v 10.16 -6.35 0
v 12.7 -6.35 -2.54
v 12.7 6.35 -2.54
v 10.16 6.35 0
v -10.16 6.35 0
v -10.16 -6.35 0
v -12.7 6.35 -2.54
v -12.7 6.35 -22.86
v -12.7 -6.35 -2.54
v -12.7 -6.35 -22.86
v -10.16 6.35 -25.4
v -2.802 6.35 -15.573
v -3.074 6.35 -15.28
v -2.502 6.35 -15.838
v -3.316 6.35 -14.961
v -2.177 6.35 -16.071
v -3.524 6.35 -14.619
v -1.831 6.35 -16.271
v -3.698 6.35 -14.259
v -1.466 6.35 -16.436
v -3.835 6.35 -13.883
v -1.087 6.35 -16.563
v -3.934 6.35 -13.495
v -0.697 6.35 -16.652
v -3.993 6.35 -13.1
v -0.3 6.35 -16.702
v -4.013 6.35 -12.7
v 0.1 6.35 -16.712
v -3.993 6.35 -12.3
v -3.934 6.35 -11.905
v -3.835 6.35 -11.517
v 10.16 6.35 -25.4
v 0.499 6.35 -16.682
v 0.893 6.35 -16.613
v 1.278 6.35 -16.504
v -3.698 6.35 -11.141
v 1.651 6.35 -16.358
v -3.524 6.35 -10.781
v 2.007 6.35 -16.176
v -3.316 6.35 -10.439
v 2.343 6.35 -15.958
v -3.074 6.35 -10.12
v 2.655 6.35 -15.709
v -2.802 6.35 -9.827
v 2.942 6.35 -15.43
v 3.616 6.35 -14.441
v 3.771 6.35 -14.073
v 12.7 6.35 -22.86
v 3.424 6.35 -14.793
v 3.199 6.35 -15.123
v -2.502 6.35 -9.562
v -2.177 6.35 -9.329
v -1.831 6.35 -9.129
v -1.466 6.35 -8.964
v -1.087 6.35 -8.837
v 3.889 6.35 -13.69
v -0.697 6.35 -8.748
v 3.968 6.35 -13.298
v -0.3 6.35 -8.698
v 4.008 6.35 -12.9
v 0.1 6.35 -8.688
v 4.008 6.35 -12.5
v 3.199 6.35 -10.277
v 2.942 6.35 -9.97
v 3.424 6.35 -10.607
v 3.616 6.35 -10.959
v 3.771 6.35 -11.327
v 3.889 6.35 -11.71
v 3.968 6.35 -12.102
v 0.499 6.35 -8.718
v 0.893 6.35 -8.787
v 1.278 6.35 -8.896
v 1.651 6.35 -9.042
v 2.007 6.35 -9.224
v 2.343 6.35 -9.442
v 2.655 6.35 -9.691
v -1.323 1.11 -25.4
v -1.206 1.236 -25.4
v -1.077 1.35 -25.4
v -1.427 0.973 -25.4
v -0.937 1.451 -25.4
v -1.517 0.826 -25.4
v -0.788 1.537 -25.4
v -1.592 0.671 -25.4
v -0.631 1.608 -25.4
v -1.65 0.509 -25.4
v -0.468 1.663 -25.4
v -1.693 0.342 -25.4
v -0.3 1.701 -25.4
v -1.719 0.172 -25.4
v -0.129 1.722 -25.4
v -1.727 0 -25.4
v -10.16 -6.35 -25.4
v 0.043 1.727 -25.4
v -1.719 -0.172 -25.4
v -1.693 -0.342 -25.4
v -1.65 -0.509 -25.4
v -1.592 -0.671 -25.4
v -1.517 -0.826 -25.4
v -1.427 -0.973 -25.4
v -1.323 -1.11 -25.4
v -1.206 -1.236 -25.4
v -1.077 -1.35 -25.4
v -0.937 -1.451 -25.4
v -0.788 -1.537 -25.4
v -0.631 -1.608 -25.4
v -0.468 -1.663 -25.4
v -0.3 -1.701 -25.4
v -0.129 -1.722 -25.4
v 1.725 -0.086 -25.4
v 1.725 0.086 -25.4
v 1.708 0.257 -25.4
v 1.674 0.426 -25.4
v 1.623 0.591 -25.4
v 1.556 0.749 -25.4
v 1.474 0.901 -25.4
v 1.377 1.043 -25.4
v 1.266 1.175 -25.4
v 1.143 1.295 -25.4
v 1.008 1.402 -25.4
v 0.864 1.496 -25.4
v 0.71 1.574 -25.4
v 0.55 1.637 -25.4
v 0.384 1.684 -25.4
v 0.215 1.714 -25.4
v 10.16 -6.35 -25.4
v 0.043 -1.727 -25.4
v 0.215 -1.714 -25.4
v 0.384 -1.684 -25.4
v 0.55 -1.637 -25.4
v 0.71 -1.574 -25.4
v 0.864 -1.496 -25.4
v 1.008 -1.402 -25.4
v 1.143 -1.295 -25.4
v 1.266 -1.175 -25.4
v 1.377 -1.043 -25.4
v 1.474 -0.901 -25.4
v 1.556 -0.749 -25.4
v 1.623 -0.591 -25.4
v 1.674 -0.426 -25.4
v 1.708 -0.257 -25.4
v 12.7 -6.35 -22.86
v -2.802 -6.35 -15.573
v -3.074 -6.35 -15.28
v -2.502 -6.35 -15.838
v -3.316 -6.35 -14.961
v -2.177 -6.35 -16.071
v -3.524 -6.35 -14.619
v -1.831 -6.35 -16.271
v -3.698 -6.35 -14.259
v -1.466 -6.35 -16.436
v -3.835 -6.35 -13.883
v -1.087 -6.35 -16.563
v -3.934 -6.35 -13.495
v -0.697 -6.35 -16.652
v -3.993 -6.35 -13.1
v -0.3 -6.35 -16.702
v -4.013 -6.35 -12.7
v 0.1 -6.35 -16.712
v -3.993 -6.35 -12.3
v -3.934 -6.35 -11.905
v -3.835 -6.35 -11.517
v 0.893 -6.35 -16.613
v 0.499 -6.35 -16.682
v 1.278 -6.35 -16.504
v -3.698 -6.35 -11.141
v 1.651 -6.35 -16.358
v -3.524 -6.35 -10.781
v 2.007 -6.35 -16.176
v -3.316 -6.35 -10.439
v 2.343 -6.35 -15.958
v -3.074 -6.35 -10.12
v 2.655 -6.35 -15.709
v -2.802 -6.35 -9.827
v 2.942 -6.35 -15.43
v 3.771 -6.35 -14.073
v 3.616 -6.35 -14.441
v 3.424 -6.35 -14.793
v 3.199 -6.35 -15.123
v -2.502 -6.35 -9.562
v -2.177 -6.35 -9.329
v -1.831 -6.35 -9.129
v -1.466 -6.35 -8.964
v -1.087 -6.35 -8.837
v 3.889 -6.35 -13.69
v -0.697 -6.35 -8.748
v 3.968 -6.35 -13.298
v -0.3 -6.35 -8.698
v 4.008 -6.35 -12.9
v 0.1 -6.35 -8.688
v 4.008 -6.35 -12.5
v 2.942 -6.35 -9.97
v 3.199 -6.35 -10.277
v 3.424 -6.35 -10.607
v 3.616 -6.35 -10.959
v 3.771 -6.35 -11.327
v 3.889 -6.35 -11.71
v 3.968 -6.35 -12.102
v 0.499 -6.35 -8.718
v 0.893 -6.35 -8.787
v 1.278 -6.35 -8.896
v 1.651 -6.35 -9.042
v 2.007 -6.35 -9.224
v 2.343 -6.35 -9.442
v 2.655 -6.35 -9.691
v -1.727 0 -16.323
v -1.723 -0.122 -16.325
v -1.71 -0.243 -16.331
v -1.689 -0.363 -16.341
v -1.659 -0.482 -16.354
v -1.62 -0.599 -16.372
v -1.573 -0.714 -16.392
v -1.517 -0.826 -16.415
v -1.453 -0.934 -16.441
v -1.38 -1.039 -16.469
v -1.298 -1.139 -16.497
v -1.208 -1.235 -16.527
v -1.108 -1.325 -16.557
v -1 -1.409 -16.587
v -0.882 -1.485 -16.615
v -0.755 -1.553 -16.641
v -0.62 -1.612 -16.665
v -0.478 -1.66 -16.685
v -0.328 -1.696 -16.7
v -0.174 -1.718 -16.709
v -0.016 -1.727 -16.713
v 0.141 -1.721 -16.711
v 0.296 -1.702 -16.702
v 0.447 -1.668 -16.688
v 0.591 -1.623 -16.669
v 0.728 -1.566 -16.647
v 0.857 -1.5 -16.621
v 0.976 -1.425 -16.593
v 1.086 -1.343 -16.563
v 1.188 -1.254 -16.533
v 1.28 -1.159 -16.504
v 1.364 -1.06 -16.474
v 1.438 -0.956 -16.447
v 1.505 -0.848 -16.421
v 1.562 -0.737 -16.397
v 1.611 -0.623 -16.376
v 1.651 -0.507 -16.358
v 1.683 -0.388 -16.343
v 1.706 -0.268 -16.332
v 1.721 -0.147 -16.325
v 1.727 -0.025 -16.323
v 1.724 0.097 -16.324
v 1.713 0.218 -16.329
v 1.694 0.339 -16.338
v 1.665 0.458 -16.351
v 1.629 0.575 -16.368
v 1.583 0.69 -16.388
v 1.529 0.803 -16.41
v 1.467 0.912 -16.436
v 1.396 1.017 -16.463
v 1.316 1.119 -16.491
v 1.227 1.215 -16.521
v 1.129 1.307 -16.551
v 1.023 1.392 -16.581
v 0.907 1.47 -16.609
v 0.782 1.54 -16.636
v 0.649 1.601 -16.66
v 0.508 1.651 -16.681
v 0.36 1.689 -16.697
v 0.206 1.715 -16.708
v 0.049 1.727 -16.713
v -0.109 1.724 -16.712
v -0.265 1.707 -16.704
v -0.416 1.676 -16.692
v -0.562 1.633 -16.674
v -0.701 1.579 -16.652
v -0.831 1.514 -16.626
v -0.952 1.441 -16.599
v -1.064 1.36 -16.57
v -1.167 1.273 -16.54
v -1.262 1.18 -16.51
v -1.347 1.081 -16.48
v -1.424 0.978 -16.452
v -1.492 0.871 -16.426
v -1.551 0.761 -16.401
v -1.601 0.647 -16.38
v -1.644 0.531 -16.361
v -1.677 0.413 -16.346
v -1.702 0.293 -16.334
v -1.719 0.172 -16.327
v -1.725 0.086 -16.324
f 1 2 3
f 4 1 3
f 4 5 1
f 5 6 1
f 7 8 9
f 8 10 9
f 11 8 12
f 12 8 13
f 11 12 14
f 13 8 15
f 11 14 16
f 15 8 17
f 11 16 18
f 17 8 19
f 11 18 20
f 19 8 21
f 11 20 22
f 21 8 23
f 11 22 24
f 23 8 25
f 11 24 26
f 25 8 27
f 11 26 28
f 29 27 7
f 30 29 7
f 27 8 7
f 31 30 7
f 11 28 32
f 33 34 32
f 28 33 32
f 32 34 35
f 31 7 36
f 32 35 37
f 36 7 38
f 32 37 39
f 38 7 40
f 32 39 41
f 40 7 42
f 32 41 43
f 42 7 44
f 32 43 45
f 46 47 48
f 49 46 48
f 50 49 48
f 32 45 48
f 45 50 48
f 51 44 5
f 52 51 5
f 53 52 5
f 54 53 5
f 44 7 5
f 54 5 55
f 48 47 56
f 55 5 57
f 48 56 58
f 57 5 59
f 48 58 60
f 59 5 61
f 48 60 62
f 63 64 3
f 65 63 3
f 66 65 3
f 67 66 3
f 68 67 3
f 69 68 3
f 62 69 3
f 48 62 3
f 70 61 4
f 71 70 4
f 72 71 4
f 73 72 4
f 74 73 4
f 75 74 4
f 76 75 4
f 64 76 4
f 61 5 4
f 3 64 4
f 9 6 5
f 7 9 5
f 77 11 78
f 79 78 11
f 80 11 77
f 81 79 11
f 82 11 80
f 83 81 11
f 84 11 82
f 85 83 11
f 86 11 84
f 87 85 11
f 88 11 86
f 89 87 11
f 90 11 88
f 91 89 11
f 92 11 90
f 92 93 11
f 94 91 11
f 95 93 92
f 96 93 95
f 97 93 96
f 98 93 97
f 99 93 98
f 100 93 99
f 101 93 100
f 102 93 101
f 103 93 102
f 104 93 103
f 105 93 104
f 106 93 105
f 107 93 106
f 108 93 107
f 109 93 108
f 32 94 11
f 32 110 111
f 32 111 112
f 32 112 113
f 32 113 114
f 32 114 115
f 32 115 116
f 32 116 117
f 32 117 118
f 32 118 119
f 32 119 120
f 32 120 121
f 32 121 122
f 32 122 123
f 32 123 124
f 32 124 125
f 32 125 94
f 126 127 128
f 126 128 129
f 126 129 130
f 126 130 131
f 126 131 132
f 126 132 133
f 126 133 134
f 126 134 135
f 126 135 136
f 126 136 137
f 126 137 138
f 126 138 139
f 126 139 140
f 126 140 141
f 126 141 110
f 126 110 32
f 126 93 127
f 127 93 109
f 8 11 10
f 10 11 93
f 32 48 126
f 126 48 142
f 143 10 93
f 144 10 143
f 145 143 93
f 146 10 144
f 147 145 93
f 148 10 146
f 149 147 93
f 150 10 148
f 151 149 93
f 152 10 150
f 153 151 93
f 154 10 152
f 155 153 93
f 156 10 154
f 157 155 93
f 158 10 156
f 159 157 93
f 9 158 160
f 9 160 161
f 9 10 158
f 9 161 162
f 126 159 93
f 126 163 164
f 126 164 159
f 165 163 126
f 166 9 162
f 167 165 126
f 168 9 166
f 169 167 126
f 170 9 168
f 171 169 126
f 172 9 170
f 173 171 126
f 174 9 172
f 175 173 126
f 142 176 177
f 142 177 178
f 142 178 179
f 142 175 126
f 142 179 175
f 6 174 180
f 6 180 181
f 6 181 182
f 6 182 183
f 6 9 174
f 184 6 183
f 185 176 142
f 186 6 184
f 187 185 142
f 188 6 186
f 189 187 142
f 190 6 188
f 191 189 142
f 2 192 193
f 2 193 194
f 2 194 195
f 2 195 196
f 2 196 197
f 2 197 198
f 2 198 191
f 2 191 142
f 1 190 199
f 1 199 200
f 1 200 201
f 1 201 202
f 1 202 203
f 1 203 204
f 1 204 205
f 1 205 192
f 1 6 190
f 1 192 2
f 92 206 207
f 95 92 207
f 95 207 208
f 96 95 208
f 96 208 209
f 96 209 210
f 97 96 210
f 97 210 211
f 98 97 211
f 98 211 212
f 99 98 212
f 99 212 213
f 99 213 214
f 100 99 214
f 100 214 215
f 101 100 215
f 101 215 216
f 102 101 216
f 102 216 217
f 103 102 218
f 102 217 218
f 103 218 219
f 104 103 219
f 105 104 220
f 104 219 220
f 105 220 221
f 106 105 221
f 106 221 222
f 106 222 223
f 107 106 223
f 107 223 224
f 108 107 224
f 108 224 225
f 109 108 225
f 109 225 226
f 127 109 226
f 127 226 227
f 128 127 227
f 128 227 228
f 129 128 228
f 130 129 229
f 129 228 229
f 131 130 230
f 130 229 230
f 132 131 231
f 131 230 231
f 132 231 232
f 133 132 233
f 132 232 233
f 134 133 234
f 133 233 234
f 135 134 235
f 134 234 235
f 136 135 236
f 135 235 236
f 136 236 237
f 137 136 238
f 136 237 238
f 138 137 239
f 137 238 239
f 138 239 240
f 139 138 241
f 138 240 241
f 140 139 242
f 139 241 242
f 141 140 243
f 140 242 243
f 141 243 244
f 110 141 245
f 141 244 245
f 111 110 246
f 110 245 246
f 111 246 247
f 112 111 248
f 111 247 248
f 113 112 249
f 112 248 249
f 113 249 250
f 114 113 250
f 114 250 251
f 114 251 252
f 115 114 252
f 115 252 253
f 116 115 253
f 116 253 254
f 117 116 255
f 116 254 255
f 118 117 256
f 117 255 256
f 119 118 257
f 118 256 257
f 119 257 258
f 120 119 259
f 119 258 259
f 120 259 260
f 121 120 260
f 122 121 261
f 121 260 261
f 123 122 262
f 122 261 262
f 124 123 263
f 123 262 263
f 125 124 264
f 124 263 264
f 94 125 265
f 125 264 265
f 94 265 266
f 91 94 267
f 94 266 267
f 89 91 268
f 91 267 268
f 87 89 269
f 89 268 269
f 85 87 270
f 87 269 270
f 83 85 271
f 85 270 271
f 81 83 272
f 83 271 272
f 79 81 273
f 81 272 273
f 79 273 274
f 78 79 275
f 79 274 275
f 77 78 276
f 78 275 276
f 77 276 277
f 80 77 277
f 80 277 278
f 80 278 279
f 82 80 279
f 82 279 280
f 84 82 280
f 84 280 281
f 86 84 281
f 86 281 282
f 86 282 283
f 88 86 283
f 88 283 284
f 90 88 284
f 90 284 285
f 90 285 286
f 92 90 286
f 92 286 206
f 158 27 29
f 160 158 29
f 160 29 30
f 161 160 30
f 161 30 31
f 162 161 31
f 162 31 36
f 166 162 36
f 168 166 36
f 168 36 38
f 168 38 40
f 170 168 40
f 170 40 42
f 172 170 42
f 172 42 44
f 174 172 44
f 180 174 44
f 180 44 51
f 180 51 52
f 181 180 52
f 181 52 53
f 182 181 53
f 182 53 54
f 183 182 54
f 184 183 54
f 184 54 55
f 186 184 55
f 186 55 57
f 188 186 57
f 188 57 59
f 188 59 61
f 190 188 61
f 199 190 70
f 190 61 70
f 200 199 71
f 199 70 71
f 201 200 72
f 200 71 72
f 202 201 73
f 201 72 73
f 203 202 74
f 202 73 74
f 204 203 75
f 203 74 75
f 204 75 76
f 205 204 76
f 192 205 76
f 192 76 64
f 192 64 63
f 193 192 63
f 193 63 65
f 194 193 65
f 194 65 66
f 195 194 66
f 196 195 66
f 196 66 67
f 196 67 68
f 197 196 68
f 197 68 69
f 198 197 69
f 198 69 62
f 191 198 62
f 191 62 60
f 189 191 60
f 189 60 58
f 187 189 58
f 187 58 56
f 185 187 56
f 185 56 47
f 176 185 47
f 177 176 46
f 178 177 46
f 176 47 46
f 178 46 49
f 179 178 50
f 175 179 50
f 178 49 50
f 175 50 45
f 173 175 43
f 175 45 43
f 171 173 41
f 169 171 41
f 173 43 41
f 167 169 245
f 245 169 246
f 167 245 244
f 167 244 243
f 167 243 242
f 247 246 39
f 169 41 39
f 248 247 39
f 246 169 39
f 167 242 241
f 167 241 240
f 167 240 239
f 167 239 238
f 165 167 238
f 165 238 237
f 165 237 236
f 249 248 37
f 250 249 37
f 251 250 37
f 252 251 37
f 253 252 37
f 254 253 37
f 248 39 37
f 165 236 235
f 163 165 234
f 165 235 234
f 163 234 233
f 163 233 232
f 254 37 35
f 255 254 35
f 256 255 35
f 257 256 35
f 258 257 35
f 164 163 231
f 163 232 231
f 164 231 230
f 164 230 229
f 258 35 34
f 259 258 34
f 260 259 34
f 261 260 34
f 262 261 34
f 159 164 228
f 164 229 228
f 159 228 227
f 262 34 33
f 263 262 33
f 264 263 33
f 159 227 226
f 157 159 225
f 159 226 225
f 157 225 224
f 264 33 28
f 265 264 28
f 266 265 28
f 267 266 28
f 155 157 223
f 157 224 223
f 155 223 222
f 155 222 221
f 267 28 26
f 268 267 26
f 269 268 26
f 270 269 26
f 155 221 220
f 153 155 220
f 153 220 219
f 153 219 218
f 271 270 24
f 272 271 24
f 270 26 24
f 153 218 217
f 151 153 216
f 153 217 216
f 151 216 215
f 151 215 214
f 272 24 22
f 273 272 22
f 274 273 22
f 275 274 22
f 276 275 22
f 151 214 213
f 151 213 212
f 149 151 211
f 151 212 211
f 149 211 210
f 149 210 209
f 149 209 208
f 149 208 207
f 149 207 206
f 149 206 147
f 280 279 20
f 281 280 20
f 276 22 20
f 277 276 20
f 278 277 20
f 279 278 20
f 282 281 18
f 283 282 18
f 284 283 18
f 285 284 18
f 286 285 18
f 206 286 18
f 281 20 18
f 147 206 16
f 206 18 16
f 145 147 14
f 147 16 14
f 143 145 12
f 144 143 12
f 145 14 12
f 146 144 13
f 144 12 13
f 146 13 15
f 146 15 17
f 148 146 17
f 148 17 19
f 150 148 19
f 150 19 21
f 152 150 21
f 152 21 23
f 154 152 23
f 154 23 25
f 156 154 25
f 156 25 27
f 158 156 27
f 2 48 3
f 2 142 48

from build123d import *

# Parameters (mm, degrees)
F0_W     = 25.4
F0_H     = 25.4
F1_DEPTH = 6.35
F3_D     = 8.0264
F5_D     = 3.4544
F5_DEPTH = 15.08125
F5_TIP   = 1.0378064612
F6_SIZE  = 2.54


with BuildPart() as f1:
    # F0 (on Front) → F1 (new body, symmetric)
    with BuildSketch(Plane.XZ):
        with Locations((0, -12.7)):
            Rectangle(F0_W, F0_H)
    extrude(amount=F1_DEPTH, both=True)

    # F3 (through all)
    with Locations(Plane.XZ.offset(6.35)):
        with Locations((0, -12.7)):
            Hole(F3_D / 2)

    # F5
    with Locations(Plane(origin=(0, 0, -25.4), x_dir=(1, 0, 0), z_dir=(0, 0, -1))):
        with Locations((0, 0)):
            Hole(F5_D / 2, depth=F5_DEPTH)
            with Locations((0, 0, -(F5_DEPTH + F5_TIP / 2))):  # 118° drill point
                Cone(0, F5_D / 2, F5_TIP, mode=Mode.SUBTRACT)

    # F6
    f6_edges = [f1.edges().sort_by_distance(p)[0] for p in [
        (12.7, 0, -25.4),
        (-12.7, 0, -25.4),
        (-12.7, 0, 0),
        (12.7, 0, 0),
    ]]
    chamfer(f6_edges, length=F6_SIZE)


solid = f1.part
